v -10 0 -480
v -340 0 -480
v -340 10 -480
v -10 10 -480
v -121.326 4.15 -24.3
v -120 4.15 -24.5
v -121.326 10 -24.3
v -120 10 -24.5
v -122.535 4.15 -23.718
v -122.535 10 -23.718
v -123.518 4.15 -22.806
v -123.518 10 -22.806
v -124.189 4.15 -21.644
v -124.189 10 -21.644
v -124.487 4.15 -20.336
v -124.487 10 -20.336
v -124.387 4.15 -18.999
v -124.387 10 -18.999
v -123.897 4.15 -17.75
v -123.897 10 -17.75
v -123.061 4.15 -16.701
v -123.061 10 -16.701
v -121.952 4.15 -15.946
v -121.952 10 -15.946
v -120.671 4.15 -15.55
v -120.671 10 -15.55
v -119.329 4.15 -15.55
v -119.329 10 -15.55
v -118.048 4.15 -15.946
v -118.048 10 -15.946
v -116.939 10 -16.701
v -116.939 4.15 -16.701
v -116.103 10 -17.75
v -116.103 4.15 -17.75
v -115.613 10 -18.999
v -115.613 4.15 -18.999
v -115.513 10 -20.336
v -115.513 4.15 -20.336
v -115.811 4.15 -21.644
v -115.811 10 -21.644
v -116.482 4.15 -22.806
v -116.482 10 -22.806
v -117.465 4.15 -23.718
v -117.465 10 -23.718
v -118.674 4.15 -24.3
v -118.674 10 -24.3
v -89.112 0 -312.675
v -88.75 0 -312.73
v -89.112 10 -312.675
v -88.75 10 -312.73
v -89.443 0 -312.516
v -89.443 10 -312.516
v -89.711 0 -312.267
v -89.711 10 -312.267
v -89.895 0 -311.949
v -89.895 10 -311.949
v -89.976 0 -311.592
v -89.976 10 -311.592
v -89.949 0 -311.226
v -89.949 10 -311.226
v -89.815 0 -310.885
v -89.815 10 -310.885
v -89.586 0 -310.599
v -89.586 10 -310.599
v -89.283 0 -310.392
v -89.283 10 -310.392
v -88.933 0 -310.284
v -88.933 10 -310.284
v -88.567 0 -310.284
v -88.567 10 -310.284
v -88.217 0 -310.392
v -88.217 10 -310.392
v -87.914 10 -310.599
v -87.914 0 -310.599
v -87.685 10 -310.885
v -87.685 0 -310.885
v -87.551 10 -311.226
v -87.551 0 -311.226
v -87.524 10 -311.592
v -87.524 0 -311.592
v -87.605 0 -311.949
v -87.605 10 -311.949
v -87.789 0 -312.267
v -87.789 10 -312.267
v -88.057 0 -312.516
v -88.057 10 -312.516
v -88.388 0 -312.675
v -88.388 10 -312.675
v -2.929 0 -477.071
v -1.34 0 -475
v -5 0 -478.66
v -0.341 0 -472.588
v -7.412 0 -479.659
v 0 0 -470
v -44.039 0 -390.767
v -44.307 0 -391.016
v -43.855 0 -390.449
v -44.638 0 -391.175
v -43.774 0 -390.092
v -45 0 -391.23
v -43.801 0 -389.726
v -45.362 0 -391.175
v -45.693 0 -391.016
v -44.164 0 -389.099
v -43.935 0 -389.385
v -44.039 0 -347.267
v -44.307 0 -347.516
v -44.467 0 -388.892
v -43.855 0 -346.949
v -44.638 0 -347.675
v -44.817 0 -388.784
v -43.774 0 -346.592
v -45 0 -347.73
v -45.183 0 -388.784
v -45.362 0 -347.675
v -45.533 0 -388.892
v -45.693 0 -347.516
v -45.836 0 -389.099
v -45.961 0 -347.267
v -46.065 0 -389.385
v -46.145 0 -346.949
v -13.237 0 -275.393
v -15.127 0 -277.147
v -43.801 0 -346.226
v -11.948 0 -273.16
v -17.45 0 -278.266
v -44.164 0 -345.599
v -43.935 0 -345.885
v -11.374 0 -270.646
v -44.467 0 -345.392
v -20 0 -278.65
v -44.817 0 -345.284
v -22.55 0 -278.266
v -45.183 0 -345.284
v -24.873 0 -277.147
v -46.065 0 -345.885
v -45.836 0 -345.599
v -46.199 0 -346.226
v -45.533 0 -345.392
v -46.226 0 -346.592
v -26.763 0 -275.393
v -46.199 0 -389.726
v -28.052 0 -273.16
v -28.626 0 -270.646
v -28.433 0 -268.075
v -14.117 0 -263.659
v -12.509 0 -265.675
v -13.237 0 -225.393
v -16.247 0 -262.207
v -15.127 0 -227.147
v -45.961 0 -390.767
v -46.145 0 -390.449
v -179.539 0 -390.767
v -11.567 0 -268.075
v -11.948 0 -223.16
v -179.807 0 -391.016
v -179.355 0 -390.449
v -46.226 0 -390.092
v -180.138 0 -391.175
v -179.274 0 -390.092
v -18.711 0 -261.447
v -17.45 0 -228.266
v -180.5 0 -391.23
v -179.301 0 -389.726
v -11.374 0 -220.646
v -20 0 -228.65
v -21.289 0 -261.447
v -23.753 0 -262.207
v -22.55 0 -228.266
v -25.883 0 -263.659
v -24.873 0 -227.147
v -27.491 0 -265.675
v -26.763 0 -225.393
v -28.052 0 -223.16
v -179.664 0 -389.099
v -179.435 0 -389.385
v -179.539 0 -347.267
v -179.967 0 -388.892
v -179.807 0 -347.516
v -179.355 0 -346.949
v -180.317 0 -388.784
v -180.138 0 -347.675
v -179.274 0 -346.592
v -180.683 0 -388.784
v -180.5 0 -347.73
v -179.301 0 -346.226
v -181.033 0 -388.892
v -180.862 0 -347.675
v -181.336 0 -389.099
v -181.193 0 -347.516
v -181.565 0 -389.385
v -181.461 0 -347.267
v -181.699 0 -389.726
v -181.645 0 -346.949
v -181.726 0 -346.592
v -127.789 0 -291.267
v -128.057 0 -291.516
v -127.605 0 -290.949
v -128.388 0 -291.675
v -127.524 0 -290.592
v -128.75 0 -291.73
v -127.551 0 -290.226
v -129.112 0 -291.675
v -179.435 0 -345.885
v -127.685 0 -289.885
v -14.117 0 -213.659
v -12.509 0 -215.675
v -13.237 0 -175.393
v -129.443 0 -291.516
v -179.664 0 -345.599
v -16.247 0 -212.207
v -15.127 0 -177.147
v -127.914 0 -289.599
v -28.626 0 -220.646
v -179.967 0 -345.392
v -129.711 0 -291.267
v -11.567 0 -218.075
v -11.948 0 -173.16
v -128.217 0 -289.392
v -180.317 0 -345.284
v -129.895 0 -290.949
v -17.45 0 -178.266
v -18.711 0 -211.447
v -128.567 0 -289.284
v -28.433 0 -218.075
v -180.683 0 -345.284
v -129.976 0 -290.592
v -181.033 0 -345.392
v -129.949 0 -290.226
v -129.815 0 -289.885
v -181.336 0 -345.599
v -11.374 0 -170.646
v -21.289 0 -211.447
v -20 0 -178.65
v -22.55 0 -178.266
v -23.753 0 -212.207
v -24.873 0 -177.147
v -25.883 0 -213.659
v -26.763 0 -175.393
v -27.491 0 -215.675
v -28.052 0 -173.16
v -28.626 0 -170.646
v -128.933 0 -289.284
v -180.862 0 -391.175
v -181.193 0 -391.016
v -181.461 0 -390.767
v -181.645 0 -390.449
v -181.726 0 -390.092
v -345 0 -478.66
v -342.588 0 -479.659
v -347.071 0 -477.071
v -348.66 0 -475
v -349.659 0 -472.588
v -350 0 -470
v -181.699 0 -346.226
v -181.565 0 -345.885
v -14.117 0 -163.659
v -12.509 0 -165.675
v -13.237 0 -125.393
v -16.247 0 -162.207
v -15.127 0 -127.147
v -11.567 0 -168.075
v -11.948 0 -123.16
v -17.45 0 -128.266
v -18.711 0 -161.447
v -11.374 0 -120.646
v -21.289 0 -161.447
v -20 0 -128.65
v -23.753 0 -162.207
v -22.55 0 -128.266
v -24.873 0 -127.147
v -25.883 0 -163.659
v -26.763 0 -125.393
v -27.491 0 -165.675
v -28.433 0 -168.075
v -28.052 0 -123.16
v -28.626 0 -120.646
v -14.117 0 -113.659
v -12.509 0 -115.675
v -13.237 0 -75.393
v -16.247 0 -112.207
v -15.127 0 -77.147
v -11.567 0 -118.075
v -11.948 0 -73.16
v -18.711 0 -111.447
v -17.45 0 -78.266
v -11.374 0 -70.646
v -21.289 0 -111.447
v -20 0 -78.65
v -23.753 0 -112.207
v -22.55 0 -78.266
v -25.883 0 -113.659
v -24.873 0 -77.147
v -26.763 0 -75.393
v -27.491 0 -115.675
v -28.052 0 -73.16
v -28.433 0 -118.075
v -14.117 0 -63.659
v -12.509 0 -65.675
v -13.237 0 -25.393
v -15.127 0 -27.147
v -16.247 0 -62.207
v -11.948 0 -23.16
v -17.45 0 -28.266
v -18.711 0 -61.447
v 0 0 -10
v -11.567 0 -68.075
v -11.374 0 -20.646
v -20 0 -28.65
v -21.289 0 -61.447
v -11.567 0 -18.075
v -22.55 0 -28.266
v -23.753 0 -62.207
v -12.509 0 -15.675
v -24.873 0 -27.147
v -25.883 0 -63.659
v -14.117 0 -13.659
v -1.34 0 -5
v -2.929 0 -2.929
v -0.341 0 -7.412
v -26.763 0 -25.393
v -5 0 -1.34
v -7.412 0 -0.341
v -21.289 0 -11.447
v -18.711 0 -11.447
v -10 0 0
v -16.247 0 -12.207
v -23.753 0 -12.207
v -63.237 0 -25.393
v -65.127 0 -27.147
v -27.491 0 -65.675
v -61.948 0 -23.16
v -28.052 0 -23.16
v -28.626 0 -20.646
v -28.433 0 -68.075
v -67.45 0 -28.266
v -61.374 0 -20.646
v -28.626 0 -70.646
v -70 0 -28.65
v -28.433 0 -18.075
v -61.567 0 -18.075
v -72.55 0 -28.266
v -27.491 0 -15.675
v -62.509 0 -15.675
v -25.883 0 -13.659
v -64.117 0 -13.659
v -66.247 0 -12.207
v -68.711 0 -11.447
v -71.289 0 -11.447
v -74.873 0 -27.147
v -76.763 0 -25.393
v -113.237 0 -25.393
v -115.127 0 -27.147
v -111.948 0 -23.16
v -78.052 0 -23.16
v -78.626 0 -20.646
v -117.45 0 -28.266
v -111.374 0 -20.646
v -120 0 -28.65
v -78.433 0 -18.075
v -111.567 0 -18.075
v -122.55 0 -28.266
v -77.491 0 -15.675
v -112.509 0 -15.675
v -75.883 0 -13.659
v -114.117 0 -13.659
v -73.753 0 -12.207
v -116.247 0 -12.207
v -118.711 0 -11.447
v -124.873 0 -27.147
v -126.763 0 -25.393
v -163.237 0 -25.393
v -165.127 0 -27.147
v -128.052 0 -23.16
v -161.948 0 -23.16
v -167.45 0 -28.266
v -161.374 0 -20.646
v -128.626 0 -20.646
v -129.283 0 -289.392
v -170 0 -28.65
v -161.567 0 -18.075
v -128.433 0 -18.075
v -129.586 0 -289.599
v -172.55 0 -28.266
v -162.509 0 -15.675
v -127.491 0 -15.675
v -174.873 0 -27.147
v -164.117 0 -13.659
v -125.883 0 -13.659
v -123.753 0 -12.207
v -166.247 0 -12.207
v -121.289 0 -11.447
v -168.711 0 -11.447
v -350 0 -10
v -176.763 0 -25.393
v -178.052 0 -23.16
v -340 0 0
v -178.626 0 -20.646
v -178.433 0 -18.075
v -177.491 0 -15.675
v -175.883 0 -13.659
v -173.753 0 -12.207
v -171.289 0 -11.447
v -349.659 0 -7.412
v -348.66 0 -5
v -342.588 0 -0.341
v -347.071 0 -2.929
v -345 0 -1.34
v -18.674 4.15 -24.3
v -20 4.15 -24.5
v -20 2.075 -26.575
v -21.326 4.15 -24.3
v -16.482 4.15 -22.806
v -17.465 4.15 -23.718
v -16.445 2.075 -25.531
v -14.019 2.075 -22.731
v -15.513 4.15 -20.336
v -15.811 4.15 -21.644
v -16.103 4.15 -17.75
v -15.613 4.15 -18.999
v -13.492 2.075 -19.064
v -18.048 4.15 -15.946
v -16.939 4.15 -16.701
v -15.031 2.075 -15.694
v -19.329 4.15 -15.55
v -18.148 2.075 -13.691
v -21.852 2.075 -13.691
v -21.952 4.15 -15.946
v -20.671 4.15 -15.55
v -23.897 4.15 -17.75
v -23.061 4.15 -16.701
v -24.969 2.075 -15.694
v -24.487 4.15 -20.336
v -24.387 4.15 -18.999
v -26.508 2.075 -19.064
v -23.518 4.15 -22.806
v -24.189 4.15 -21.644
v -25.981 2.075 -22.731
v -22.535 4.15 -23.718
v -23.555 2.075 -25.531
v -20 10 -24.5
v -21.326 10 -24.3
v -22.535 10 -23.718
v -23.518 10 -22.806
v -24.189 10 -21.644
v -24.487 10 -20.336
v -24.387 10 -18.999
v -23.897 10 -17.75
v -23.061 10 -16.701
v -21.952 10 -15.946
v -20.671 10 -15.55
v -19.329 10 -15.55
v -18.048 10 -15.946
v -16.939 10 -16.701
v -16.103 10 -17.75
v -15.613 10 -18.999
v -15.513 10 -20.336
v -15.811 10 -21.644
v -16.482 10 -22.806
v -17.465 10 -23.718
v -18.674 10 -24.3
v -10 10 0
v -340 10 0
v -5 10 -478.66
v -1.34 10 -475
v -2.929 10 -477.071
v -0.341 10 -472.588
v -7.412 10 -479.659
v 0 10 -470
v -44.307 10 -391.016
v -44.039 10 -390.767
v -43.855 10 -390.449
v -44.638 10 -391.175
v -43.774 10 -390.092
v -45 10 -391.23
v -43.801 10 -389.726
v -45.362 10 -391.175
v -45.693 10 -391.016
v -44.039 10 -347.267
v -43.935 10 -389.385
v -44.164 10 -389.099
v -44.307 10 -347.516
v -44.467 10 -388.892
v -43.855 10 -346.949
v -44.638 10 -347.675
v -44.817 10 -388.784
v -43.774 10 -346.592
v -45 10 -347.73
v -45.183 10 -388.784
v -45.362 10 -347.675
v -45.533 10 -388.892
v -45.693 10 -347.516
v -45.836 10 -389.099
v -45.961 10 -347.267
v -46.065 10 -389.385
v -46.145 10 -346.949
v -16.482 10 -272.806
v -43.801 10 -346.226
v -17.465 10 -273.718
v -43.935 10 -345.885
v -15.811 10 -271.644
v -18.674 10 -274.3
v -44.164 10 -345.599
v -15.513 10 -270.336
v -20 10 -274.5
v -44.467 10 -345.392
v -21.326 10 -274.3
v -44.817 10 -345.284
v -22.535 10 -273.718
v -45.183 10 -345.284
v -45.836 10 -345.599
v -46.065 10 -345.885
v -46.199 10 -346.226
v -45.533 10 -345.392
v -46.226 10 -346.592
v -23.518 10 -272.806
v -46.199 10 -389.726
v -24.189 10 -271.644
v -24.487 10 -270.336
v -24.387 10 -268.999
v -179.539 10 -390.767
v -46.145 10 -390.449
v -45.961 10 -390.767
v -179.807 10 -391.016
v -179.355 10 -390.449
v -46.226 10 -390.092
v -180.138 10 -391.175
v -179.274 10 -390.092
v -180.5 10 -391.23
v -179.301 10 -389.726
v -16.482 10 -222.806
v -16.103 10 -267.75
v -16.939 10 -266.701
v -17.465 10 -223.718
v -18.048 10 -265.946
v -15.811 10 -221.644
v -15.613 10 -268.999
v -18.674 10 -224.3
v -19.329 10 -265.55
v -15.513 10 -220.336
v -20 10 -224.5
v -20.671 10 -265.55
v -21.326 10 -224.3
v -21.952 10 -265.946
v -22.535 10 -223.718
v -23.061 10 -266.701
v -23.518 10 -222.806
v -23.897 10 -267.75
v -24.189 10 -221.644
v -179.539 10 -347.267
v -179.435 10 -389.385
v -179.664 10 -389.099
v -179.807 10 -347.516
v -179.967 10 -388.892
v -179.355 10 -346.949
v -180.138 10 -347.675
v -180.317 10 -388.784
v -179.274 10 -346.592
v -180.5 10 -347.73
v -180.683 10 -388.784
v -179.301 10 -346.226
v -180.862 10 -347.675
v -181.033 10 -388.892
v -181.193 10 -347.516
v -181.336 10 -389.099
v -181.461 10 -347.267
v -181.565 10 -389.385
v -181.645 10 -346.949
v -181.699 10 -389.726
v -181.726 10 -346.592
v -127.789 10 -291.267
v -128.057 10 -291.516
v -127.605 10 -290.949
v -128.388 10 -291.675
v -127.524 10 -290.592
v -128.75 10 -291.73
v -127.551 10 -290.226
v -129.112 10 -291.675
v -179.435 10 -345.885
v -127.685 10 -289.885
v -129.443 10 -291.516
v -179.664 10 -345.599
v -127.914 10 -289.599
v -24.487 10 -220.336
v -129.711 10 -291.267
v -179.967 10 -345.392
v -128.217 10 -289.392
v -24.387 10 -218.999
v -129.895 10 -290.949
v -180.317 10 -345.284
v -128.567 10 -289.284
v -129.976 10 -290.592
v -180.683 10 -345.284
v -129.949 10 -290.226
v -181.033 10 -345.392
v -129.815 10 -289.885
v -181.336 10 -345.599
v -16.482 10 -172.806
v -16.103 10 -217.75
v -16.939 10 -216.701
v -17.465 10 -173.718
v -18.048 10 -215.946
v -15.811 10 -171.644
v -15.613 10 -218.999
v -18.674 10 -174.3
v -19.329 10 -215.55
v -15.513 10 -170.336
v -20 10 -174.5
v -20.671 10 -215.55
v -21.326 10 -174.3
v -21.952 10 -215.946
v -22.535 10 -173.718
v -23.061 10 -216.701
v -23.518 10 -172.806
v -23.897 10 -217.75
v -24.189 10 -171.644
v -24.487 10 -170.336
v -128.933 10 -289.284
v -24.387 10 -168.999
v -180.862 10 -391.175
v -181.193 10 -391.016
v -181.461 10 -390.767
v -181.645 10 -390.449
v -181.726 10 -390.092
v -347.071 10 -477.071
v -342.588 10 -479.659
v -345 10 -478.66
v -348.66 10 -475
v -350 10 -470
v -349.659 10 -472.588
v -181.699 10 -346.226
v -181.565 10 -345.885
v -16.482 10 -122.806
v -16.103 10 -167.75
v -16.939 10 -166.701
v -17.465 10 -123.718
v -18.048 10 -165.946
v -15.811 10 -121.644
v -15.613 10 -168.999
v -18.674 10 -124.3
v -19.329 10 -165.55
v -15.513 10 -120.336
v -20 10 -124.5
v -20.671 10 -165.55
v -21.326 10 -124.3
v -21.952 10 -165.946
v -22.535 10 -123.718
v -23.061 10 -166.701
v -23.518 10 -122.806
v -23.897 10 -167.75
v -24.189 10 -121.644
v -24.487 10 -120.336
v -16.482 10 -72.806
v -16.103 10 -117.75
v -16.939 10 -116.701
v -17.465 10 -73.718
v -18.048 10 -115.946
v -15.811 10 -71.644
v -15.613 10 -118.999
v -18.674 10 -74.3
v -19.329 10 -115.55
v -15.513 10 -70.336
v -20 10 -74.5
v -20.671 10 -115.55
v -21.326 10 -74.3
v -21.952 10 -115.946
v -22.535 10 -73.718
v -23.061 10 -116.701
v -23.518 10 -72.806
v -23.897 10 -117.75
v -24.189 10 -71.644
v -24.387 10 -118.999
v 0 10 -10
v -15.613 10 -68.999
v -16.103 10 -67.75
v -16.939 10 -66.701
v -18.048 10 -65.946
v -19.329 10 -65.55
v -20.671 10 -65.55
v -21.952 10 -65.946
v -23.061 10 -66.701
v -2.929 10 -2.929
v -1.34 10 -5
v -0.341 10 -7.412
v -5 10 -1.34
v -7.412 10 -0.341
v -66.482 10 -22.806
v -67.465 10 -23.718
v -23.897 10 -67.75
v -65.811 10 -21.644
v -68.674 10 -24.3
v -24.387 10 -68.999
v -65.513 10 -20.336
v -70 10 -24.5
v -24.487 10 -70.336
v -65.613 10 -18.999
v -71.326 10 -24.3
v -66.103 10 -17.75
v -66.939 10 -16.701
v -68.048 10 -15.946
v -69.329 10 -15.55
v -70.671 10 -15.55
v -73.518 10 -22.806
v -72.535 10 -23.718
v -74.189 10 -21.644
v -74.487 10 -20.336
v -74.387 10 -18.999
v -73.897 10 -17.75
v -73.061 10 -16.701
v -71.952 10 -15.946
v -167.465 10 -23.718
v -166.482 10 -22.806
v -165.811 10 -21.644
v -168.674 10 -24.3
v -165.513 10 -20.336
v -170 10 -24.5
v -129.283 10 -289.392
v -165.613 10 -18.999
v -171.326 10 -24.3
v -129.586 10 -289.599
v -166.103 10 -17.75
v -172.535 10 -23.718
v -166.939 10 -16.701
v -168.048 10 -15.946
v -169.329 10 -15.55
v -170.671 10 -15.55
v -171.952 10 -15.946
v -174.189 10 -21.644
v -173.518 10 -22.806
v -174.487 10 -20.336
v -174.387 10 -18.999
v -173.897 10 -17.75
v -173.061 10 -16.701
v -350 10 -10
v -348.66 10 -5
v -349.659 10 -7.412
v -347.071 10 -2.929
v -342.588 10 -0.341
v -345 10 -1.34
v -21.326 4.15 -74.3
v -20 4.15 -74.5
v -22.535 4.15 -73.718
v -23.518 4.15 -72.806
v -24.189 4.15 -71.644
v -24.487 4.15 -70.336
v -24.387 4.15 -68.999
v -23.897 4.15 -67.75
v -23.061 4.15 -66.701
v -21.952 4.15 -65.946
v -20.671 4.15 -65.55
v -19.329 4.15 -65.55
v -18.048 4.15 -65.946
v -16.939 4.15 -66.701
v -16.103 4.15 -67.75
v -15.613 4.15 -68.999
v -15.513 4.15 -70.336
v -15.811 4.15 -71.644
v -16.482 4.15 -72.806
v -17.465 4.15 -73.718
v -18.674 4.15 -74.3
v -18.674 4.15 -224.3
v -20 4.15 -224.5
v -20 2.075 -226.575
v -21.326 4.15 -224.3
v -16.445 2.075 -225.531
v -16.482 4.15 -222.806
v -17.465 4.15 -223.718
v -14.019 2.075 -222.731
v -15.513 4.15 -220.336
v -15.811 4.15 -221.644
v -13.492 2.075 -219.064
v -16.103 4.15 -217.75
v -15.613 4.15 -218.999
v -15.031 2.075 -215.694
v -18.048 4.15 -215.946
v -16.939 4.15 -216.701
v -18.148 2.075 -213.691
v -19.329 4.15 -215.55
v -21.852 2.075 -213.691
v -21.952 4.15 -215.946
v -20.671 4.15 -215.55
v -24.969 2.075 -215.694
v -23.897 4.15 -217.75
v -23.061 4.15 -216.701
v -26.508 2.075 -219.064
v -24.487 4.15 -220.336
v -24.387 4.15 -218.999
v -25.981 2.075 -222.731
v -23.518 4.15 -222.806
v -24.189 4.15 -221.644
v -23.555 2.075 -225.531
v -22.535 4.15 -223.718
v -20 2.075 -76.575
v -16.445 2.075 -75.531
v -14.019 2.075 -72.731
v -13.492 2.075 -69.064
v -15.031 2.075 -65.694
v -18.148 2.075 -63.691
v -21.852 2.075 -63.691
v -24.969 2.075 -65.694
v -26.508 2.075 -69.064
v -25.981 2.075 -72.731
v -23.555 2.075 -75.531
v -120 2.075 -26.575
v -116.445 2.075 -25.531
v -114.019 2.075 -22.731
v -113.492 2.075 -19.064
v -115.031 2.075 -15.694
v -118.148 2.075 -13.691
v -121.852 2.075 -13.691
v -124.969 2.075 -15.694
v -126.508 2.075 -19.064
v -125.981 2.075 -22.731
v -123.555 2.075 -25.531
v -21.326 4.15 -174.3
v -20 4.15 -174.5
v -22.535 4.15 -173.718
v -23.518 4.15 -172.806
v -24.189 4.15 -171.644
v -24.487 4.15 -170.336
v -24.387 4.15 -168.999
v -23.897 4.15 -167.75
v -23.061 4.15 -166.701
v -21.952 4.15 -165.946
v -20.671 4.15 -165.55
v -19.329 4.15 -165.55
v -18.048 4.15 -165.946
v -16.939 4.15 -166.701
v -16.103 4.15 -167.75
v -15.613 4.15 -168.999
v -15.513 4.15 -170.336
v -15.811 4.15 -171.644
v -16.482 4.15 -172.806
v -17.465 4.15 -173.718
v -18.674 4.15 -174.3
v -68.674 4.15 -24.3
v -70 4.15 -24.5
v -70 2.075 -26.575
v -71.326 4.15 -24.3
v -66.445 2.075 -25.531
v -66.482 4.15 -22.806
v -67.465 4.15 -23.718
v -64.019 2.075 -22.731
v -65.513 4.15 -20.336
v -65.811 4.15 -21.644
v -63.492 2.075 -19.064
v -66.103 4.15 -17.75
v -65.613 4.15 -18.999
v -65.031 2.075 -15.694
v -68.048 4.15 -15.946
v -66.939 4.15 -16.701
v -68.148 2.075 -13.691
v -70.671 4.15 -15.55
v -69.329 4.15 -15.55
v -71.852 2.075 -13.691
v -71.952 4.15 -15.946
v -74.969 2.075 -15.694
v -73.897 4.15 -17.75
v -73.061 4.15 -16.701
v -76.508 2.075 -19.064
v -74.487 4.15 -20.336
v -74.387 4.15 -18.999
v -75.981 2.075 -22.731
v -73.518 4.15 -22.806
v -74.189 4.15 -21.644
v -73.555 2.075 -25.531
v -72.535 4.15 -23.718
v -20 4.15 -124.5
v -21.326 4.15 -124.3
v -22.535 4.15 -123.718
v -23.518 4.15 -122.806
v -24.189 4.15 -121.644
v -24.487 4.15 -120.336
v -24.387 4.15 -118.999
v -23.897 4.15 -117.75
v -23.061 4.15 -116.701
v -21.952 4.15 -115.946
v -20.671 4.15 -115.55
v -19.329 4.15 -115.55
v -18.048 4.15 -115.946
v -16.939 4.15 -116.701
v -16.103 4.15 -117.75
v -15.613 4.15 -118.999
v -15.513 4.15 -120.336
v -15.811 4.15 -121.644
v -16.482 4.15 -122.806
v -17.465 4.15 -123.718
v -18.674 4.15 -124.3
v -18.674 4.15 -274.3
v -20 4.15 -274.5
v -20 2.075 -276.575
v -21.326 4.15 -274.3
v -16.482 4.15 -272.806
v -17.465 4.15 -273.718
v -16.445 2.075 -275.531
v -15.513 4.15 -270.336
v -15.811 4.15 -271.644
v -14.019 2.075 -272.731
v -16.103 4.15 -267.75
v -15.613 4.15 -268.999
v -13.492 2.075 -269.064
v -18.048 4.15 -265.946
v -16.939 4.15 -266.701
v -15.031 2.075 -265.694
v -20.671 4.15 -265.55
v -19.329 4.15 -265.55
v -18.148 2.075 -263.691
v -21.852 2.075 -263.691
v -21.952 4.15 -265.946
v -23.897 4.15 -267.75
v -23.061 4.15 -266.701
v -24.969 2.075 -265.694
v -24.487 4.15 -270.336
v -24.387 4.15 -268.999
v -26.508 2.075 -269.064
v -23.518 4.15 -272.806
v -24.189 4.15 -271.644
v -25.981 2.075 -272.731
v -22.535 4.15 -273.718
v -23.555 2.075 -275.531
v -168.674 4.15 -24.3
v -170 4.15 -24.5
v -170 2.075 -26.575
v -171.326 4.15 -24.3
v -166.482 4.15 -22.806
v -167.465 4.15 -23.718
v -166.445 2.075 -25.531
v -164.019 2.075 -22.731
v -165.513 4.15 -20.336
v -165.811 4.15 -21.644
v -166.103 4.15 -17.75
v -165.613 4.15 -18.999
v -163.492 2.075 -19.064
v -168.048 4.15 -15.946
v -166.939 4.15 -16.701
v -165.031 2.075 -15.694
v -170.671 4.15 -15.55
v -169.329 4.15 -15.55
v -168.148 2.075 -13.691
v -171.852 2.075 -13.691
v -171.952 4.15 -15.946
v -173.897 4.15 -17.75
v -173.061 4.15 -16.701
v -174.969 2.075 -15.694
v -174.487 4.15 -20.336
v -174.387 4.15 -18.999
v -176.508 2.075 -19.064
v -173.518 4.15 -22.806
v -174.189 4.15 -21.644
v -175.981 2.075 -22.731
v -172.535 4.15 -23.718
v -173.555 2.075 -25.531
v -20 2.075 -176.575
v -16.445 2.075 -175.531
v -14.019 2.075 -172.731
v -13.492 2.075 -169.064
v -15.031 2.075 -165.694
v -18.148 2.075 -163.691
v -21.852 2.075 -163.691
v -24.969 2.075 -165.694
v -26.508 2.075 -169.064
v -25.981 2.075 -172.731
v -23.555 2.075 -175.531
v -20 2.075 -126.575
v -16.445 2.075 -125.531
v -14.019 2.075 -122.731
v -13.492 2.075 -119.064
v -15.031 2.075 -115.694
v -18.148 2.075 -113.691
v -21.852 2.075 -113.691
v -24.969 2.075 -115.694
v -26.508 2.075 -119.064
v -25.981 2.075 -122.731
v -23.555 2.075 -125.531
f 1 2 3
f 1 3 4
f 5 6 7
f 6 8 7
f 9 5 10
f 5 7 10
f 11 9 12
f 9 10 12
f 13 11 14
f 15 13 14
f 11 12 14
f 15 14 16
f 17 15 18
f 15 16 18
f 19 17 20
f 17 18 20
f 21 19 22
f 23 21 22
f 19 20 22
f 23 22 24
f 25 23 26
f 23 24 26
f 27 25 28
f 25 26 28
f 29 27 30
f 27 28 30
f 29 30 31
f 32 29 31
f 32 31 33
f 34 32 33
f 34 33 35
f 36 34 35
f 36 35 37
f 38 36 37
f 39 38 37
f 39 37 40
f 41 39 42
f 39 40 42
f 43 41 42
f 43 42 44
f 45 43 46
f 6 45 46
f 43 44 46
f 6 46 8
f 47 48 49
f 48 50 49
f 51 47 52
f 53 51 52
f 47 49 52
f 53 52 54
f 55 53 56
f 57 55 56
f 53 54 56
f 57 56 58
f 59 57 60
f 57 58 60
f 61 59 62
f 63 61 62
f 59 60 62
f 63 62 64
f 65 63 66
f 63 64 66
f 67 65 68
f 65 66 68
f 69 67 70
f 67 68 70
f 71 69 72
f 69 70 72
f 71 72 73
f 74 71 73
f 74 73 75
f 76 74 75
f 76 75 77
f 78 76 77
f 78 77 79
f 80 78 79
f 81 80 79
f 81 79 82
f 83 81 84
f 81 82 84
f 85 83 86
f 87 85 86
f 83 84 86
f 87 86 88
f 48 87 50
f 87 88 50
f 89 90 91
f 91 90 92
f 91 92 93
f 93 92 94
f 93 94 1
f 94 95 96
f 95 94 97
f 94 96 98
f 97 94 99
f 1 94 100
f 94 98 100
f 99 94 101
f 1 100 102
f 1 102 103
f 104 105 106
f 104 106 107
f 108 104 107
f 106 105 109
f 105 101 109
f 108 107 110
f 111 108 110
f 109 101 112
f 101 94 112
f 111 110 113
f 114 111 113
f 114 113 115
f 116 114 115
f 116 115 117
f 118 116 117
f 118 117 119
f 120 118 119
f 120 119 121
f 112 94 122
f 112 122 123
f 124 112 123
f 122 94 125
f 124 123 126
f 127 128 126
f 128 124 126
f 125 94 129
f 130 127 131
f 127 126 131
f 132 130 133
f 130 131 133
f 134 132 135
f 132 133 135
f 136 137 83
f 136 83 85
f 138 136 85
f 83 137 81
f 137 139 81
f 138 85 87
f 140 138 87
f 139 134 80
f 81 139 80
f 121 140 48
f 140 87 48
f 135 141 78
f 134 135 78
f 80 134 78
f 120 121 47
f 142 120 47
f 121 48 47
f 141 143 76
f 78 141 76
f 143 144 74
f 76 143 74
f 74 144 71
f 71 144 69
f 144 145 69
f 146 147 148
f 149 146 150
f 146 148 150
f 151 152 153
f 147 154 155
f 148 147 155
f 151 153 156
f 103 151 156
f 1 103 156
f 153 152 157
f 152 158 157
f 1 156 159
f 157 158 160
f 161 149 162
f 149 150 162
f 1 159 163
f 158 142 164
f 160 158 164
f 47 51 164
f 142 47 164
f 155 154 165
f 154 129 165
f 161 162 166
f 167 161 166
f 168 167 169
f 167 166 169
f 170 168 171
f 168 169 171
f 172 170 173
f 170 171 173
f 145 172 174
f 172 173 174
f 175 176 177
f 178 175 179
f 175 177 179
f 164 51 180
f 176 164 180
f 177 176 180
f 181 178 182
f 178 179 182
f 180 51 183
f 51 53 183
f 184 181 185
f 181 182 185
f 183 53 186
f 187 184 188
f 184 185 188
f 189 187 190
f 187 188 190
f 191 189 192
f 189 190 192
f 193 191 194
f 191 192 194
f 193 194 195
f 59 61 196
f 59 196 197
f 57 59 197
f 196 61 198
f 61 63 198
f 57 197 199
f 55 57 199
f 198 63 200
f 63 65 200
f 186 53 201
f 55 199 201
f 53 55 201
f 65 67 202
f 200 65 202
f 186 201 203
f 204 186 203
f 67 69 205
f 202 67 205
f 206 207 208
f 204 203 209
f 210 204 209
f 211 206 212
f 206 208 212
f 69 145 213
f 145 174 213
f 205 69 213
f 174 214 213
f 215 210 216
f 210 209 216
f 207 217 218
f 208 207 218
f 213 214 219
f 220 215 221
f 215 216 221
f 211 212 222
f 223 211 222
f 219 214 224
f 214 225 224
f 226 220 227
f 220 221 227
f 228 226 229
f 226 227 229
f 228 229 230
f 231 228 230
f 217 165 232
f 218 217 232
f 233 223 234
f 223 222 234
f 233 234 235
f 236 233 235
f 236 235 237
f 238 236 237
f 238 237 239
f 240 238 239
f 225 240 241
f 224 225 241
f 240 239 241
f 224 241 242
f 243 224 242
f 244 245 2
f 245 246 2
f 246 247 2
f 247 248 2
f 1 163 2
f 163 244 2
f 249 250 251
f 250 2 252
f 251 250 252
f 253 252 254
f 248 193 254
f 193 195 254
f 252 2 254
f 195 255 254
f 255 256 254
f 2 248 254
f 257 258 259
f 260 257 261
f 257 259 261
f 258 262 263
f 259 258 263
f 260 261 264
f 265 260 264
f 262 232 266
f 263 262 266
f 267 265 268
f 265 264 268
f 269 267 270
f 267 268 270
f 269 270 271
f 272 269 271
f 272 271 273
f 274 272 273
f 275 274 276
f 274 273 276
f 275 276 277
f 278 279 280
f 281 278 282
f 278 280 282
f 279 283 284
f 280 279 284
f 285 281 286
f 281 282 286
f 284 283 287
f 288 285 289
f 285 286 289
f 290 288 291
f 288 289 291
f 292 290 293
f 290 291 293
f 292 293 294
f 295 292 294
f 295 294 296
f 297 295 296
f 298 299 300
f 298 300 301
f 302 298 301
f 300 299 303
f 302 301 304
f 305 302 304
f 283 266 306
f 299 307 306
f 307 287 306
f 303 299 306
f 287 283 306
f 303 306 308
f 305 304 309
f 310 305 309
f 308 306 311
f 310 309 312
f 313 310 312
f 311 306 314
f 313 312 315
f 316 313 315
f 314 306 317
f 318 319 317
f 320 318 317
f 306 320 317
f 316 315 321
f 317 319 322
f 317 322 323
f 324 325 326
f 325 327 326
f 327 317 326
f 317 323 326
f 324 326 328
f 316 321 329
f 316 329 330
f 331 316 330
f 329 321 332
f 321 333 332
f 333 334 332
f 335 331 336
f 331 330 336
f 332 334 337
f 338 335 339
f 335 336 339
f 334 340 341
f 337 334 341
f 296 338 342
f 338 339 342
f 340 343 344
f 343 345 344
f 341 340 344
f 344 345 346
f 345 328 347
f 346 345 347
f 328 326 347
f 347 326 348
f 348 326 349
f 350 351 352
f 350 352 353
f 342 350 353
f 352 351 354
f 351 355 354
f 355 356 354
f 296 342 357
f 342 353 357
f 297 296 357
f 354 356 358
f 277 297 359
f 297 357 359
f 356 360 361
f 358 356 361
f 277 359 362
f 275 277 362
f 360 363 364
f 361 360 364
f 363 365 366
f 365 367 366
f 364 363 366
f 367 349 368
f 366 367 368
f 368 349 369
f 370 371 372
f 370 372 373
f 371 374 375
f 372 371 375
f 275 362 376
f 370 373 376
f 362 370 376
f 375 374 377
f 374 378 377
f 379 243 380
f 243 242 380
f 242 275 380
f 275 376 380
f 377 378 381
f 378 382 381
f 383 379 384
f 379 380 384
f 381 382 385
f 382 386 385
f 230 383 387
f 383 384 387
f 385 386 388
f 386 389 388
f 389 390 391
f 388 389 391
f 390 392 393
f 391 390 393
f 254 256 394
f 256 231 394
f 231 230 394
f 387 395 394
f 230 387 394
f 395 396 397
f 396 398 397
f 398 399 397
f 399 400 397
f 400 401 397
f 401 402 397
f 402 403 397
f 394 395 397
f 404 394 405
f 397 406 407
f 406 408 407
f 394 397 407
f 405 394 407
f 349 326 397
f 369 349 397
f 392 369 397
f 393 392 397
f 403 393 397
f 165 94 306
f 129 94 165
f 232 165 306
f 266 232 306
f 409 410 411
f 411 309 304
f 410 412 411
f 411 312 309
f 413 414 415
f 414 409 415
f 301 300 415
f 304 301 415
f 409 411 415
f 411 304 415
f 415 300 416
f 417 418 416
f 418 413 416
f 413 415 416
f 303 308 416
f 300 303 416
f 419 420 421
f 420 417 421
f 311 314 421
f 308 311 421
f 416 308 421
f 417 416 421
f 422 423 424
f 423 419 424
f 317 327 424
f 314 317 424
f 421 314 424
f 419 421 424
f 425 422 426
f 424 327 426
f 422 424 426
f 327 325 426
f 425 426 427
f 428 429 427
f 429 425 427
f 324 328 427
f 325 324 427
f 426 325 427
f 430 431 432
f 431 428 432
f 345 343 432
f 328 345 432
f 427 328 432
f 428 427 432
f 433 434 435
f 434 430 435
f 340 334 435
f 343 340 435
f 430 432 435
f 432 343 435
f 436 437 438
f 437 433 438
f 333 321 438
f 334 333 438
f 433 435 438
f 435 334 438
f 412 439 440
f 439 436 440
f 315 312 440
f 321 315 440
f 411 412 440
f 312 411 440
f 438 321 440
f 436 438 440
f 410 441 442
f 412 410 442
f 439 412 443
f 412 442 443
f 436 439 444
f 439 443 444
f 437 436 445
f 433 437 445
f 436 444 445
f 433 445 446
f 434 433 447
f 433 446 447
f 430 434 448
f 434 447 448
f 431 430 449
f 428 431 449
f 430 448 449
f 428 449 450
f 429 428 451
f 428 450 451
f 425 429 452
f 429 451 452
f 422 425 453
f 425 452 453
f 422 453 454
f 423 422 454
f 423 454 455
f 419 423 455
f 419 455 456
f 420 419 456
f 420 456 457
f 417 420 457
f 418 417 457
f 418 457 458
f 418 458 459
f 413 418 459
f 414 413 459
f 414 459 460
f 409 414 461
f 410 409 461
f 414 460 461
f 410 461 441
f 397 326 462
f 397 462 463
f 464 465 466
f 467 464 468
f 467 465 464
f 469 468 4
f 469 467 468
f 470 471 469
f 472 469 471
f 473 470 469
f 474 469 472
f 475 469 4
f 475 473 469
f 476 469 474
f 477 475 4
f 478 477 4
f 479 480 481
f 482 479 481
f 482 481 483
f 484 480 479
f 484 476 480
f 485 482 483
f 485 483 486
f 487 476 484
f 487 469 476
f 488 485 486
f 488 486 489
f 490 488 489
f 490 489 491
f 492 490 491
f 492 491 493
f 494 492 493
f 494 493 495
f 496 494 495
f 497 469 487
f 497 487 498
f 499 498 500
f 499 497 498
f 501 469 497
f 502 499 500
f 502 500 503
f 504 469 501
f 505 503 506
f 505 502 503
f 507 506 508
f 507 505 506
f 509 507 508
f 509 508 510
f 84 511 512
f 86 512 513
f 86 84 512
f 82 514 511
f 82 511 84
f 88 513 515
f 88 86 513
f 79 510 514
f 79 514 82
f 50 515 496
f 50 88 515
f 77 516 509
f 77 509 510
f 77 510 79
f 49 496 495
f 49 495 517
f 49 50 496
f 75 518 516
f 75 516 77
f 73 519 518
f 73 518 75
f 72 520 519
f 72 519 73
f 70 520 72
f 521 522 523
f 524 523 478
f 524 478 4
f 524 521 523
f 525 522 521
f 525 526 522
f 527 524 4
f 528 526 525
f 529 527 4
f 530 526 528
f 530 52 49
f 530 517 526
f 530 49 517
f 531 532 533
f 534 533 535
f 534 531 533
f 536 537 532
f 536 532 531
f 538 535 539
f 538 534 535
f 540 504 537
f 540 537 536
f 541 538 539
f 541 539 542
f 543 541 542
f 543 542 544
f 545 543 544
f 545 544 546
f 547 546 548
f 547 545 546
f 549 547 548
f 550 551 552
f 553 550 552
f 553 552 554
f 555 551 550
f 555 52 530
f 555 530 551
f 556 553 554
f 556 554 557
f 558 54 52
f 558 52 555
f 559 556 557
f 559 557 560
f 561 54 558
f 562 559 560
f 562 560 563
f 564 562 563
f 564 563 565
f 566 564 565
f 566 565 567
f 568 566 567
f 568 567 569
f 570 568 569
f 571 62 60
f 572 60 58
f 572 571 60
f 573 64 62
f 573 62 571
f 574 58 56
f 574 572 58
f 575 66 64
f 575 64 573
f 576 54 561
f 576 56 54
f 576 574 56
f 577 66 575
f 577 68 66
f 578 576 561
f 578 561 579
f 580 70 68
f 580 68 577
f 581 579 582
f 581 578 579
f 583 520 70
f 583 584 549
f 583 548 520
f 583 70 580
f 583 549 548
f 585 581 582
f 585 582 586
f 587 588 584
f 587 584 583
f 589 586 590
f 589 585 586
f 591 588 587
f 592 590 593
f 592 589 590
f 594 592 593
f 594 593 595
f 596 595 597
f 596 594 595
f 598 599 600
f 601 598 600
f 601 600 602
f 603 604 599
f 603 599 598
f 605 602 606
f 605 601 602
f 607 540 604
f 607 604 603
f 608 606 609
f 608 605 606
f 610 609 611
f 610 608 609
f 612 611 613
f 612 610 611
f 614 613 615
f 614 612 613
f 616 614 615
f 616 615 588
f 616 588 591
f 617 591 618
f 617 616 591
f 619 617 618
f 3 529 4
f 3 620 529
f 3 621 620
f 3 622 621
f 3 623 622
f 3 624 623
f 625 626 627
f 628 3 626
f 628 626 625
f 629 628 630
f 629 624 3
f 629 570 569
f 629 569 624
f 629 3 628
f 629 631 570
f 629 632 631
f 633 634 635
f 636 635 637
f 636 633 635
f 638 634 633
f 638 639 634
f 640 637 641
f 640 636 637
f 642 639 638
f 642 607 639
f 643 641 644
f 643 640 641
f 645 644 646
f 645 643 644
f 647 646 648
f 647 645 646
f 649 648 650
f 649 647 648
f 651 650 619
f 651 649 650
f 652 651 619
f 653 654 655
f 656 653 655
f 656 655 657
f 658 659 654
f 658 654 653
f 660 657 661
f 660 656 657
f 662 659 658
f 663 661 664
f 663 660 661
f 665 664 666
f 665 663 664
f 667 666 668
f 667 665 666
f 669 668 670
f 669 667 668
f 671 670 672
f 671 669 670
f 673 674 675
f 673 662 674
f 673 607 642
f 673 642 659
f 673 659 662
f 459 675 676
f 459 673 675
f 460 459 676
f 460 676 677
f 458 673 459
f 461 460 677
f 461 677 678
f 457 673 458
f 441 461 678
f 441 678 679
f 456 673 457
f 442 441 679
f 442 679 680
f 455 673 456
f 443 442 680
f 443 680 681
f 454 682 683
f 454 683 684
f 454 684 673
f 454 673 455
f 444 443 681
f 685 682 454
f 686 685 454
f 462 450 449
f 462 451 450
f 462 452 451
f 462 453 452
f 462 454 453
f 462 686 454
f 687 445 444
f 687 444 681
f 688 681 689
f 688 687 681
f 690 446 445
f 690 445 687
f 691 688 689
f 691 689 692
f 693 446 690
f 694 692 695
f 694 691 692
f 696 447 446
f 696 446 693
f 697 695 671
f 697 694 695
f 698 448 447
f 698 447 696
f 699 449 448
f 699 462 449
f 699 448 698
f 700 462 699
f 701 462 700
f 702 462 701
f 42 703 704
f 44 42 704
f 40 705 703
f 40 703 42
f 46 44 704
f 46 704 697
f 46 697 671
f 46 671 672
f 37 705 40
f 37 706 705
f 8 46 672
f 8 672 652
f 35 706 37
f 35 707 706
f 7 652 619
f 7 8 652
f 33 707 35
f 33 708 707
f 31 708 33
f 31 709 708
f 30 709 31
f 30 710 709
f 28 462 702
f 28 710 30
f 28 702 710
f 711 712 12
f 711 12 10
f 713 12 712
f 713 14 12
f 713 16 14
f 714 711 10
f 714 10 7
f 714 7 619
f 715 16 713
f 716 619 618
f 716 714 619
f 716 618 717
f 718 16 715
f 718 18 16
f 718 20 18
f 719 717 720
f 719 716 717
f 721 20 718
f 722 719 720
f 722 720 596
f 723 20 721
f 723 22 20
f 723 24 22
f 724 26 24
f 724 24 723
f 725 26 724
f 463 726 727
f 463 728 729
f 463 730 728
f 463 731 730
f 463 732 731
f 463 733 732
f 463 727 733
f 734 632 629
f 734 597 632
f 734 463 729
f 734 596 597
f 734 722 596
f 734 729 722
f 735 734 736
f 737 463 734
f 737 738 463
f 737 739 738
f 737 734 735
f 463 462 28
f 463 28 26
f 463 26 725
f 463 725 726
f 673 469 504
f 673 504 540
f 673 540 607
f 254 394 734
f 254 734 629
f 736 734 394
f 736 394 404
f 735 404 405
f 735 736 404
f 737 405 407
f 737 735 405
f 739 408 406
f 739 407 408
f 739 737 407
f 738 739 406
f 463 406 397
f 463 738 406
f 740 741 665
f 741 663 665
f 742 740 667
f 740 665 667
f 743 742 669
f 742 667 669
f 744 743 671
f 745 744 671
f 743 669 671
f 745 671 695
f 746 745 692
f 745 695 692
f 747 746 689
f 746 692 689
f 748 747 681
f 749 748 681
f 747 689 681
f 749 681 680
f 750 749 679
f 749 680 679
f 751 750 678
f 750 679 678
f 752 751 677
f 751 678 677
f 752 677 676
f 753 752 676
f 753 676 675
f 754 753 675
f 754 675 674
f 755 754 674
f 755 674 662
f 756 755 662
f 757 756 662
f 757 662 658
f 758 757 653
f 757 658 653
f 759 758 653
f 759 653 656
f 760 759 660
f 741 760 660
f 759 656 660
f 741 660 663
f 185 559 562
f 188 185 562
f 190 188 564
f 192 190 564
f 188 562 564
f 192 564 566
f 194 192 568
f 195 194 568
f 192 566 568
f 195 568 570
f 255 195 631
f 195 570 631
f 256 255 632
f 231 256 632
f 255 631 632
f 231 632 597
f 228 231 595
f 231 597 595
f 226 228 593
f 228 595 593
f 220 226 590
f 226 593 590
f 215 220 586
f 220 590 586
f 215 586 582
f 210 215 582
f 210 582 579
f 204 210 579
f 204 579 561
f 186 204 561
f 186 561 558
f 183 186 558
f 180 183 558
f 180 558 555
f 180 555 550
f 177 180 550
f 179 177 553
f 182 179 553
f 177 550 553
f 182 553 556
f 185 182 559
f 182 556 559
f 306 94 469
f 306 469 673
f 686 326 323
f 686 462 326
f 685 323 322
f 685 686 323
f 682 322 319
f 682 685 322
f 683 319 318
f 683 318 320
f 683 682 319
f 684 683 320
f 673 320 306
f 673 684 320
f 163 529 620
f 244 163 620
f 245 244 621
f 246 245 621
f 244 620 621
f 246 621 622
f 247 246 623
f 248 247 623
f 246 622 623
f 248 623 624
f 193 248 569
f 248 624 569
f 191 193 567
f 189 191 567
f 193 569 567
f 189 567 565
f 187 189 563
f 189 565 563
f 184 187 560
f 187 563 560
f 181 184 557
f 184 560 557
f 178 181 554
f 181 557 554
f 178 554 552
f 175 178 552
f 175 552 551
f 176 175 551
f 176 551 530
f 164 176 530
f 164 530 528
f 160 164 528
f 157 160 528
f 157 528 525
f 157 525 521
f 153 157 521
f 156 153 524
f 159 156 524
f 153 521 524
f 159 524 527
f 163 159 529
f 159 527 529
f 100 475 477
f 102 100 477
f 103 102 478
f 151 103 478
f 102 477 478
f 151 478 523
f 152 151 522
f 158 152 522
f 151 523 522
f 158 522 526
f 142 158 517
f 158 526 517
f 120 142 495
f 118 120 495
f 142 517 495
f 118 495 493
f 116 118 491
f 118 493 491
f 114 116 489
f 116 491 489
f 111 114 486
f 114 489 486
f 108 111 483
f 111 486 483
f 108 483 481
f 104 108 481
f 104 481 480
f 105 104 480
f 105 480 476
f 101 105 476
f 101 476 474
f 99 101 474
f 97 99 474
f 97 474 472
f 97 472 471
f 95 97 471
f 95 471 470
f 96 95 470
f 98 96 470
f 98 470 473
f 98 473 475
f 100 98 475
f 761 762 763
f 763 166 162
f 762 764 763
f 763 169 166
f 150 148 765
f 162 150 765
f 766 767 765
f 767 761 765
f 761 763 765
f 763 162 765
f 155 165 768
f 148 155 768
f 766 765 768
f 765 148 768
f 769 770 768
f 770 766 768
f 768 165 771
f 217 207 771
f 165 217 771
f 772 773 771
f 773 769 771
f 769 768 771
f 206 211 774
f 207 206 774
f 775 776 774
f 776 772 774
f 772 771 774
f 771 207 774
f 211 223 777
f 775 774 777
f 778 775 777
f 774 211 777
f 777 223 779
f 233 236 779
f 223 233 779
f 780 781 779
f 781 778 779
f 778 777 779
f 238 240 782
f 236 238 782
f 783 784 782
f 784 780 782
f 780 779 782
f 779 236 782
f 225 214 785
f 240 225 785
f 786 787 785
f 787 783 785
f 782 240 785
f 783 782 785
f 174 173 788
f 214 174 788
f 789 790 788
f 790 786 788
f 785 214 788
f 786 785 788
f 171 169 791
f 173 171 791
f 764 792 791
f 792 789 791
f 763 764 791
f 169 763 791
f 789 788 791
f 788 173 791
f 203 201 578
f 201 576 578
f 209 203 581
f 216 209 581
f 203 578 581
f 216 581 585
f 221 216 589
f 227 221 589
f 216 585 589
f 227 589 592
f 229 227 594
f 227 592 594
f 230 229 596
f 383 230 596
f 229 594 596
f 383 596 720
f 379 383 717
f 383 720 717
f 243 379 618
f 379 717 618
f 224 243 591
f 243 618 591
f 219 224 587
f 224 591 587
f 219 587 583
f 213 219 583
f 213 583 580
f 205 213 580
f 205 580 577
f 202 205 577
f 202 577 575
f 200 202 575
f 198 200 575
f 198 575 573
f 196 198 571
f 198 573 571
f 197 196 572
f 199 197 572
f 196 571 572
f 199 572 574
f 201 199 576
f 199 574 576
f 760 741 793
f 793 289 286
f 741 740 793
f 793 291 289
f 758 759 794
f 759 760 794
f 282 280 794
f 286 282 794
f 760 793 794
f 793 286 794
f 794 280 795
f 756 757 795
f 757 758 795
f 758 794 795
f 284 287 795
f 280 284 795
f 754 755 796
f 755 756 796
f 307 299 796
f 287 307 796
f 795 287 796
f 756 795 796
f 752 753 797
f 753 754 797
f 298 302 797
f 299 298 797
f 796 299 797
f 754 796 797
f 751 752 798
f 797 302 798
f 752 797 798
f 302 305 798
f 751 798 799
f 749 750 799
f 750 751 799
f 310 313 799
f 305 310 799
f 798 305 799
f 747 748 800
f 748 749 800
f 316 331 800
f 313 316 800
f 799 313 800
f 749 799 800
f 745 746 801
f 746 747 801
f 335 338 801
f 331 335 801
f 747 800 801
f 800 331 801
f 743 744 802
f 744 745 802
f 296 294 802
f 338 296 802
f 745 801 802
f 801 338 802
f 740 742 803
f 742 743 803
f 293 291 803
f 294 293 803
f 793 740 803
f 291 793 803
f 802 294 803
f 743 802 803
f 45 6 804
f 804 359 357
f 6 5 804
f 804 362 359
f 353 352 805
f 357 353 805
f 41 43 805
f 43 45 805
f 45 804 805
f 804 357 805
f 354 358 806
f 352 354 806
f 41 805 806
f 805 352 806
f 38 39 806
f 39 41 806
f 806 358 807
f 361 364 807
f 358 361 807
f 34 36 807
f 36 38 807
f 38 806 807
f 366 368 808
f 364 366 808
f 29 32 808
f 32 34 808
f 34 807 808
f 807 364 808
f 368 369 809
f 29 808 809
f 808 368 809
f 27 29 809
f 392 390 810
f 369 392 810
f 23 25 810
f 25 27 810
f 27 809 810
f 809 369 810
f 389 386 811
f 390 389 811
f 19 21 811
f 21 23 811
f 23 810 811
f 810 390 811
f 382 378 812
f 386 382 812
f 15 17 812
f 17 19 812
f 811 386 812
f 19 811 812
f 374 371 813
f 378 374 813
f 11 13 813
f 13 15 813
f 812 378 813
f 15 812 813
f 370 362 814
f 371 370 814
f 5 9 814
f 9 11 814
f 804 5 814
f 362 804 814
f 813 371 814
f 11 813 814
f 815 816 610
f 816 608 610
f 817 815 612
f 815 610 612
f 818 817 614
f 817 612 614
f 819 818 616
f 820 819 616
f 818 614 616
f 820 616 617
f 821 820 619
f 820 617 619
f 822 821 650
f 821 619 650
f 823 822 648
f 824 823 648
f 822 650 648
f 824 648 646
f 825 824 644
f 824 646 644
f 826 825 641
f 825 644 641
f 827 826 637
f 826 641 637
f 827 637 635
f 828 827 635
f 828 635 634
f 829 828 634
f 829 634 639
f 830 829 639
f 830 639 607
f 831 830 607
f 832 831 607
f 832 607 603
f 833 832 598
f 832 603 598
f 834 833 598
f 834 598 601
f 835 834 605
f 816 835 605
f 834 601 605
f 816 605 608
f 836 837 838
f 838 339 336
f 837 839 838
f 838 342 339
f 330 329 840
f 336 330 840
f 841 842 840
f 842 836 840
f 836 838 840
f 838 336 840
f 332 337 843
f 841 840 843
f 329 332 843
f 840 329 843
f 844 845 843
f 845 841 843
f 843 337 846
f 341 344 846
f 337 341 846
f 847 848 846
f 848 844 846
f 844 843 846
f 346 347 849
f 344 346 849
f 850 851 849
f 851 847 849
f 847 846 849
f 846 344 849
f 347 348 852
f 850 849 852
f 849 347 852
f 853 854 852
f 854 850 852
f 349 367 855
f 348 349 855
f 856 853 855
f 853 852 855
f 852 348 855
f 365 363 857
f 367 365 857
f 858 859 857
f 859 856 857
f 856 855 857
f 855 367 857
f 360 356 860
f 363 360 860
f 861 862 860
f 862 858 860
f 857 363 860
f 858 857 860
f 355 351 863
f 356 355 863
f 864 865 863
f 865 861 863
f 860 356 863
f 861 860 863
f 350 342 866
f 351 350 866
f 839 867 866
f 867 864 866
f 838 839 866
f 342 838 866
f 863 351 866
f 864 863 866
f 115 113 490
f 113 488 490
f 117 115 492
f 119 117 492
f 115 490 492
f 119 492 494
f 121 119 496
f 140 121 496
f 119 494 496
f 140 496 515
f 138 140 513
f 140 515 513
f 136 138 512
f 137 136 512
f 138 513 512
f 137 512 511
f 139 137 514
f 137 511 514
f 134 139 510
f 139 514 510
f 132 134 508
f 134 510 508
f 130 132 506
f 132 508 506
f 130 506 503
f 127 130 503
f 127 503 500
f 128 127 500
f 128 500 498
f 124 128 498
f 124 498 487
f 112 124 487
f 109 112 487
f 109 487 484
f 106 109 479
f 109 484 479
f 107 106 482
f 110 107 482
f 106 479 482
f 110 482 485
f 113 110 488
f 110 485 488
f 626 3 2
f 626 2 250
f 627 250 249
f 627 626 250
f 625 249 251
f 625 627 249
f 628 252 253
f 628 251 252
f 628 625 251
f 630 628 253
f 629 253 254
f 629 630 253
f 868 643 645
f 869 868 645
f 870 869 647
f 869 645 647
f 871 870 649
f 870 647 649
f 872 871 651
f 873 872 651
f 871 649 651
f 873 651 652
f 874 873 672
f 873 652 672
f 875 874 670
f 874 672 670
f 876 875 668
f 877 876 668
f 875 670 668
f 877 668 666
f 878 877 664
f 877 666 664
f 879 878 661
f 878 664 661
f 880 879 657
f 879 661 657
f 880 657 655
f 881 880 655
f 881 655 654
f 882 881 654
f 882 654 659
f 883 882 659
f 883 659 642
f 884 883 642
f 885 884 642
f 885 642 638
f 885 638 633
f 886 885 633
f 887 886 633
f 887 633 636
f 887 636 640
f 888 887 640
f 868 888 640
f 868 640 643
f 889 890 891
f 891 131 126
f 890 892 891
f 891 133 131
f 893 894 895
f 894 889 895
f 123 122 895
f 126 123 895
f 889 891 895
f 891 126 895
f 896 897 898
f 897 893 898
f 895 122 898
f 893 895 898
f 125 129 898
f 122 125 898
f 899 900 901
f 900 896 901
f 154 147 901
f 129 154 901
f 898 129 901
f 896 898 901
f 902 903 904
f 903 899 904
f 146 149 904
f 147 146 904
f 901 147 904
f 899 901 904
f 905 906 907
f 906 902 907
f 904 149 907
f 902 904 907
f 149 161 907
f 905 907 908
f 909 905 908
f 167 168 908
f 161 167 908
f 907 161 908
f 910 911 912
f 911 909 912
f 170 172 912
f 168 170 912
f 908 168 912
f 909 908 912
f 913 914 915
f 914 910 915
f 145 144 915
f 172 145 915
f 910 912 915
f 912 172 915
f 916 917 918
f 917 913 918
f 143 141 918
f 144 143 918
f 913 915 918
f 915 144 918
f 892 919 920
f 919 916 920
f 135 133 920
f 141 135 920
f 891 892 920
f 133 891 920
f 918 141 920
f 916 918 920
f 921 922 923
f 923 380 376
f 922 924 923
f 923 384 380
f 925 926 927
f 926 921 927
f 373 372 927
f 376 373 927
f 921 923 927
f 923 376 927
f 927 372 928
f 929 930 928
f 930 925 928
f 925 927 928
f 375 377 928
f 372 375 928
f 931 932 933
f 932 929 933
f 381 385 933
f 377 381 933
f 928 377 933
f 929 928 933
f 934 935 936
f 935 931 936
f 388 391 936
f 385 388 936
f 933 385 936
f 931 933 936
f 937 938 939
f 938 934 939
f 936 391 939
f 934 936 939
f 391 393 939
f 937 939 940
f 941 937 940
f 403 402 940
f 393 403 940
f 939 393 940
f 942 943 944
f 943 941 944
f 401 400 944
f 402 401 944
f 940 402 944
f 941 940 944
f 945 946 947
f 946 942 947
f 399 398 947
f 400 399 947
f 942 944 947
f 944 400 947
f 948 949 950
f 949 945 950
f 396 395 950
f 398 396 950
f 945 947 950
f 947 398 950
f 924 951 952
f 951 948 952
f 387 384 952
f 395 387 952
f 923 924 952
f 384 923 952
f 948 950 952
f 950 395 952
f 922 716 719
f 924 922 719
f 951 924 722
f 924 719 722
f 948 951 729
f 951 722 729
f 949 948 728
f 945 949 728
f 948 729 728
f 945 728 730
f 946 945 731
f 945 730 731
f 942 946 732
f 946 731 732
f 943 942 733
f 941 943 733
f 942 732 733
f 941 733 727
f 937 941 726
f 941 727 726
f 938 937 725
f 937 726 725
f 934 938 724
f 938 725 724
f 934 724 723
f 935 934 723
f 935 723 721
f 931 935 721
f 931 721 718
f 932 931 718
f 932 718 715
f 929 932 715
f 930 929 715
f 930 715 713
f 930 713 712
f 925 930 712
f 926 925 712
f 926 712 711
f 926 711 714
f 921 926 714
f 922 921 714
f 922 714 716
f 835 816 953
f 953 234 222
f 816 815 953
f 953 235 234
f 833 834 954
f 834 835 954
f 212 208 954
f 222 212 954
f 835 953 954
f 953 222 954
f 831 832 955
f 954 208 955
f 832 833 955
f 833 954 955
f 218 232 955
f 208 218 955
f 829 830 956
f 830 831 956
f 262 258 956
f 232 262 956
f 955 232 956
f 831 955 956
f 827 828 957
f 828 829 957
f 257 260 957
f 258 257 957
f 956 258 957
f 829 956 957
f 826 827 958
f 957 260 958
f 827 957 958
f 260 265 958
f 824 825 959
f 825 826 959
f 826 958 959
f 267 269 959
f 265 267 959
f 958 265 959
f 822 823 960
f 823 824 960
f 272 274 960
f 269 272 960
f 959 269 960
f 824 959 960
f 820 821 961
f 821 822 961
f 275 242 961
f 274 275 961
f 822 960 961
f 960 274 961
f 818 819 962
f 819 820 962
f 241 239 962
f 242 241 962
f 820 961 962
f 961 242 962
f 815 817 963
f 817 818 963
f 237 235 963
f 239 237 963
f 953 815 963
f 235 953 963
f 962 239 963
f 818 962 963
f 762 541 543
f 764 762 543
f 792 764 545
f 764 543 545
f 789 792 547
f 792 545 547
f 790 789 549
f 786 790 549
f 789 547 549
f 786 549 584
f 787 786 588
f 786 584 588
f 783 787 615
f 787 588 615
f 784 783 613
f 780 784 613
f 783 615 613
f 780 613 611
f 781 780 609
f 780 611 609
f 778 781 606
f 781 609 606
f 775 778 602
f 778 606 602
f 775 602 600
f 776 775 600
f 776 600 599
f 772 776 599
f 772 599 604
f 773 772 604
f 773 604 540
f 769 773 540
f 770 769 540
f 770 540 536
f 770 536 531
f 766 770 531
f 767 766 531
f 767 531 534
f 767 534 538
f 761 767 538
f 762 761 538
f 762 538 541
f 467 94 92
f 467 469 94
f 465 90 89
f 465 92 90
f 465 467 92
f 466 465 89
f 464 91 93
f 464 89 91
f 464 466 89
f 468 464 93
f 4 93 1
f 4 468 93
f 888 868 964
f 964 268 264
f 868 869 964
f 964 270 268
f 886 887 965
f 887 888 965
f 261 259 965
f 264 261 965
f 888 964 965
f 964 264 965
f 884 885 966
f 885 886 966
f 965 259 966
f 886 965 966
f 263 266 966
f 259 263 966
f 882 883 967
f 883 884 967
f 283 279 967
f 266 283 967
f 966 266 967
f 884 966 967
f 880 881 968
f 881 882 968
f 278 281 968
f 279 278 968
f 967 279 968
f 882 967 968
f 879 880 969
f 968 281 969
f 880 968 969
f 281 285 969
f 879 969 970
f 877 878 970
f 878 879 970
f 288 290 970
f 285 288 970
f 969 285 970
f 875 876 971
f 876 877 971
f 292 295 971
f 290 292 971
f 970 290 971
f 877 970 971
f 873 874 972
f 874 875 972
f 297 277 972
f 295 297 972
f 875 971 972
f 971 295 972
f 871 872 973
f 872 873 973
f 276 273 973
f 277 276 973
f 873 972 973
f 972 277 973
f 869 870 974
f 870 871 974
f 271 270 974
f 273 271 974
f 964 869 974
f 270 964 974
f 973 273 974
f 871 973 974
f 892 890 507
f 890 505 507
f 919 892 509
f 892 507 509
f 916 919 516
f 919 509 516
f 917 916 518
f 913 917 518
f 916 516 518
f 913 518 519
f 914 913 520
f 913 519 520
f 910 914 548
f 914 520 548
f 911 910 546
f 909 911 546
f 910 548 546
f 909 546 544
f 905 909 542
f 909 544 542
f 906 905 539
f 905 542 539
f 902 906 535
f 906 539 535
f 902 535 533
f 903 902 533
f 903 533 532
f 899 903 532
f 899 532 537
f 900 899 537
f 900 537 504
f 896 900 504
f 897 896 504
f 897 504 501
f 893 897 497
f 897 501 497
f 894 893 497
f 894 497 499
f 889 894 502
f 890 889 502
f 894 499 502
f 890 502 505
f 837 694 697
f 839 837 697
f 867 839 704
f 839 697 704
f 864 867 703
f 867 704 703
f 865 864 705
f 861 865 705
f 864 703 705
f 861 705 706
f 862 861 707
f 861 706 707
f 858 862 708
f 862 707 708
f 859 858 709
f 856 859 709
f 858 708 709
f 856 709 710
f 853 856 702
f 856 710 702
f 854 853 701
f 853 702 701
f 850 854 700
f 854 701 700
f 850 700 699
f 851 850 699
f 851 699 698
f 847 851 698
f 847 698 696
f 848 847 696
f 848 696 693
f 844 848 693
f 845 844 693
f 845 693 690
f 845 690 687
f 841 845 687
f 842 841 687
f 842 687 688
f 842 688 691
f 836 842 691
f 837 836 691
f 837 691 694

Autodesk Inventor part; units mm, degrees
ref_plane "YZ Plane" through (0, 0, 0) normal (1, 0, 0) x (0, 1, 0)
ref_plane "XZ Plane" through (0, 0, 0) normal (0, 1, 0) x (-1, 0, 0)
ref_plane "XY Plane" through (0, 0, 0) normal (0, 0, 1) x (1, 0, 0)
sketch "Sketch1" plane through (0, 0, 0) normal (0, 1, 0) x (-1, 0, 0)
  line L0 (0, 0) -> (350, 0)
  line L1 (350, 0) -> (350, -480)
  line L2 (350, -480) -> (0, -480)
  line L3 (0, -480) -> (0, 0)
  dimension "d0" = 480
  dimension "d1" = 350
extrude "Extrusion1" add sketch "Sketch1" along normal blind 10
fillet "Fillet1" radius 10 4 edges at (-350, 5, 0) (0, 5, 0) (0, 5, -480) (-350, 5, -480)
sketch "Sketch5" plane through (0, 0, 0) normal (0, 1, 0) x (-1, 0, 0)
  line L0 (340, 0) -> (10, 0) projected
  line L1 (0, -10) -> (0, -470) projected
  line L2 (20, -70) -> (20, -170) construction
  line L3 (20, -120) -> (20, -220) construction
  line L4 (20, -170) -> (20, -270) construction
  line L5 (20, -20) -> (120, -20) construction
  line L6 (20, -20) -> (20, -120) construction
  line L7 (170, -20) -> (70, -20) construction
  point P0 (0, 0)
  dimension "d32" = 100
  dimension "d33" = 70
  dimension "d34" = 20
  dimension "d43" = 50
hole "Hole4" at (-170, 0, -20) at (-120, 0, -20) at (-70, 0, -20) at (-20, 0, -20) at (-20, 0, -70) at (-20, 0, -120) at (-20, 0, -170) at (-20, 0, -220) at (-20, 0, -270) direction (0, 1, 0) diameter 9 end through all countersink diameter 17.3 countersink angle 90 clearance for "Countersunk Flat Head Screw ISO 2009/7046" size "M8" standard "ISO"
sketch "Sketch2" plane through (0, 0, 0) normal (0, 1, 0) x (-1, 0, 0)
  line L0 (0, -10) -> (0, -470) projected
  line L1 (10, -480) -> (340, -480) projected
  line L2 (88.75, -311.5) -> (108.75, -311.5) construction
  line L3 (108.75, -311.5) -> (128.75, -311.5) construction
  line L4 (108.75, -311.5) -> (112.75, -346.5) construction
  line L5 (45, -346.5) -> (112.75, -346.5) construction
  line L6 (180.5, -346.5) -> (112.75, -346.5) construction
  point P0 (0, 0)
  point P1 (45, -390)
  point P2 (180.5, -390)
  point P3 (128.75, -290.5)
  dimension "d20" = 43.5
  dimension "d21" = 135.5
  dimension "d22" = 45
  dimension "d23" = 90
  dimension "d26" = 40
  dimension "d28" = 21
  dimension "d30" = 35
  dimension "d31" = 4
hole "Hole5" at (-128.75, 0, -290.5) at (-88.75, 0, -311.5) at (-180.5, 0, -346.5) at (-180.5, 0, -390) at (-45, 0, -346.5) at (-45, 0, -390) direction (0, 1, 0) diameter 2.459 end through all thread size "M3x0.5" class "6H" standard "ISO Metric profile"
sketch "Sketch3" plane through (0, 0, 0) normal (0, 1, 0) x (-1, 0, 0)
  line L0 (350, -470) -> (350, -10) construction
  line L1 (350, -20) -> (330, -20) construction
  line L2 (330, -20) -> (330, 0) construction
  line L3 (0, -10) -> (0, -470) construction
  line L4 (0, -20) -> (20, -20) construction
  line L5 (20, -20) -> (20, 0) construction
  line L6 (340, 0) -> (10, 0) construction
  line L7 (0, -460) -> (20, -460) construction
  line L8 (20, -460) -> (20, -480) construction
  line L9 (10, -480) -> (340, -480) construction
  line L10 (330, -480) -> (330, -460) construction
  line L11 (330, -460) -> (350, -460) construction
  point P0 (0, 0)
  dimension "d12" = 20
properties part number "bottom_plate" material "Acetal Resin, White"
